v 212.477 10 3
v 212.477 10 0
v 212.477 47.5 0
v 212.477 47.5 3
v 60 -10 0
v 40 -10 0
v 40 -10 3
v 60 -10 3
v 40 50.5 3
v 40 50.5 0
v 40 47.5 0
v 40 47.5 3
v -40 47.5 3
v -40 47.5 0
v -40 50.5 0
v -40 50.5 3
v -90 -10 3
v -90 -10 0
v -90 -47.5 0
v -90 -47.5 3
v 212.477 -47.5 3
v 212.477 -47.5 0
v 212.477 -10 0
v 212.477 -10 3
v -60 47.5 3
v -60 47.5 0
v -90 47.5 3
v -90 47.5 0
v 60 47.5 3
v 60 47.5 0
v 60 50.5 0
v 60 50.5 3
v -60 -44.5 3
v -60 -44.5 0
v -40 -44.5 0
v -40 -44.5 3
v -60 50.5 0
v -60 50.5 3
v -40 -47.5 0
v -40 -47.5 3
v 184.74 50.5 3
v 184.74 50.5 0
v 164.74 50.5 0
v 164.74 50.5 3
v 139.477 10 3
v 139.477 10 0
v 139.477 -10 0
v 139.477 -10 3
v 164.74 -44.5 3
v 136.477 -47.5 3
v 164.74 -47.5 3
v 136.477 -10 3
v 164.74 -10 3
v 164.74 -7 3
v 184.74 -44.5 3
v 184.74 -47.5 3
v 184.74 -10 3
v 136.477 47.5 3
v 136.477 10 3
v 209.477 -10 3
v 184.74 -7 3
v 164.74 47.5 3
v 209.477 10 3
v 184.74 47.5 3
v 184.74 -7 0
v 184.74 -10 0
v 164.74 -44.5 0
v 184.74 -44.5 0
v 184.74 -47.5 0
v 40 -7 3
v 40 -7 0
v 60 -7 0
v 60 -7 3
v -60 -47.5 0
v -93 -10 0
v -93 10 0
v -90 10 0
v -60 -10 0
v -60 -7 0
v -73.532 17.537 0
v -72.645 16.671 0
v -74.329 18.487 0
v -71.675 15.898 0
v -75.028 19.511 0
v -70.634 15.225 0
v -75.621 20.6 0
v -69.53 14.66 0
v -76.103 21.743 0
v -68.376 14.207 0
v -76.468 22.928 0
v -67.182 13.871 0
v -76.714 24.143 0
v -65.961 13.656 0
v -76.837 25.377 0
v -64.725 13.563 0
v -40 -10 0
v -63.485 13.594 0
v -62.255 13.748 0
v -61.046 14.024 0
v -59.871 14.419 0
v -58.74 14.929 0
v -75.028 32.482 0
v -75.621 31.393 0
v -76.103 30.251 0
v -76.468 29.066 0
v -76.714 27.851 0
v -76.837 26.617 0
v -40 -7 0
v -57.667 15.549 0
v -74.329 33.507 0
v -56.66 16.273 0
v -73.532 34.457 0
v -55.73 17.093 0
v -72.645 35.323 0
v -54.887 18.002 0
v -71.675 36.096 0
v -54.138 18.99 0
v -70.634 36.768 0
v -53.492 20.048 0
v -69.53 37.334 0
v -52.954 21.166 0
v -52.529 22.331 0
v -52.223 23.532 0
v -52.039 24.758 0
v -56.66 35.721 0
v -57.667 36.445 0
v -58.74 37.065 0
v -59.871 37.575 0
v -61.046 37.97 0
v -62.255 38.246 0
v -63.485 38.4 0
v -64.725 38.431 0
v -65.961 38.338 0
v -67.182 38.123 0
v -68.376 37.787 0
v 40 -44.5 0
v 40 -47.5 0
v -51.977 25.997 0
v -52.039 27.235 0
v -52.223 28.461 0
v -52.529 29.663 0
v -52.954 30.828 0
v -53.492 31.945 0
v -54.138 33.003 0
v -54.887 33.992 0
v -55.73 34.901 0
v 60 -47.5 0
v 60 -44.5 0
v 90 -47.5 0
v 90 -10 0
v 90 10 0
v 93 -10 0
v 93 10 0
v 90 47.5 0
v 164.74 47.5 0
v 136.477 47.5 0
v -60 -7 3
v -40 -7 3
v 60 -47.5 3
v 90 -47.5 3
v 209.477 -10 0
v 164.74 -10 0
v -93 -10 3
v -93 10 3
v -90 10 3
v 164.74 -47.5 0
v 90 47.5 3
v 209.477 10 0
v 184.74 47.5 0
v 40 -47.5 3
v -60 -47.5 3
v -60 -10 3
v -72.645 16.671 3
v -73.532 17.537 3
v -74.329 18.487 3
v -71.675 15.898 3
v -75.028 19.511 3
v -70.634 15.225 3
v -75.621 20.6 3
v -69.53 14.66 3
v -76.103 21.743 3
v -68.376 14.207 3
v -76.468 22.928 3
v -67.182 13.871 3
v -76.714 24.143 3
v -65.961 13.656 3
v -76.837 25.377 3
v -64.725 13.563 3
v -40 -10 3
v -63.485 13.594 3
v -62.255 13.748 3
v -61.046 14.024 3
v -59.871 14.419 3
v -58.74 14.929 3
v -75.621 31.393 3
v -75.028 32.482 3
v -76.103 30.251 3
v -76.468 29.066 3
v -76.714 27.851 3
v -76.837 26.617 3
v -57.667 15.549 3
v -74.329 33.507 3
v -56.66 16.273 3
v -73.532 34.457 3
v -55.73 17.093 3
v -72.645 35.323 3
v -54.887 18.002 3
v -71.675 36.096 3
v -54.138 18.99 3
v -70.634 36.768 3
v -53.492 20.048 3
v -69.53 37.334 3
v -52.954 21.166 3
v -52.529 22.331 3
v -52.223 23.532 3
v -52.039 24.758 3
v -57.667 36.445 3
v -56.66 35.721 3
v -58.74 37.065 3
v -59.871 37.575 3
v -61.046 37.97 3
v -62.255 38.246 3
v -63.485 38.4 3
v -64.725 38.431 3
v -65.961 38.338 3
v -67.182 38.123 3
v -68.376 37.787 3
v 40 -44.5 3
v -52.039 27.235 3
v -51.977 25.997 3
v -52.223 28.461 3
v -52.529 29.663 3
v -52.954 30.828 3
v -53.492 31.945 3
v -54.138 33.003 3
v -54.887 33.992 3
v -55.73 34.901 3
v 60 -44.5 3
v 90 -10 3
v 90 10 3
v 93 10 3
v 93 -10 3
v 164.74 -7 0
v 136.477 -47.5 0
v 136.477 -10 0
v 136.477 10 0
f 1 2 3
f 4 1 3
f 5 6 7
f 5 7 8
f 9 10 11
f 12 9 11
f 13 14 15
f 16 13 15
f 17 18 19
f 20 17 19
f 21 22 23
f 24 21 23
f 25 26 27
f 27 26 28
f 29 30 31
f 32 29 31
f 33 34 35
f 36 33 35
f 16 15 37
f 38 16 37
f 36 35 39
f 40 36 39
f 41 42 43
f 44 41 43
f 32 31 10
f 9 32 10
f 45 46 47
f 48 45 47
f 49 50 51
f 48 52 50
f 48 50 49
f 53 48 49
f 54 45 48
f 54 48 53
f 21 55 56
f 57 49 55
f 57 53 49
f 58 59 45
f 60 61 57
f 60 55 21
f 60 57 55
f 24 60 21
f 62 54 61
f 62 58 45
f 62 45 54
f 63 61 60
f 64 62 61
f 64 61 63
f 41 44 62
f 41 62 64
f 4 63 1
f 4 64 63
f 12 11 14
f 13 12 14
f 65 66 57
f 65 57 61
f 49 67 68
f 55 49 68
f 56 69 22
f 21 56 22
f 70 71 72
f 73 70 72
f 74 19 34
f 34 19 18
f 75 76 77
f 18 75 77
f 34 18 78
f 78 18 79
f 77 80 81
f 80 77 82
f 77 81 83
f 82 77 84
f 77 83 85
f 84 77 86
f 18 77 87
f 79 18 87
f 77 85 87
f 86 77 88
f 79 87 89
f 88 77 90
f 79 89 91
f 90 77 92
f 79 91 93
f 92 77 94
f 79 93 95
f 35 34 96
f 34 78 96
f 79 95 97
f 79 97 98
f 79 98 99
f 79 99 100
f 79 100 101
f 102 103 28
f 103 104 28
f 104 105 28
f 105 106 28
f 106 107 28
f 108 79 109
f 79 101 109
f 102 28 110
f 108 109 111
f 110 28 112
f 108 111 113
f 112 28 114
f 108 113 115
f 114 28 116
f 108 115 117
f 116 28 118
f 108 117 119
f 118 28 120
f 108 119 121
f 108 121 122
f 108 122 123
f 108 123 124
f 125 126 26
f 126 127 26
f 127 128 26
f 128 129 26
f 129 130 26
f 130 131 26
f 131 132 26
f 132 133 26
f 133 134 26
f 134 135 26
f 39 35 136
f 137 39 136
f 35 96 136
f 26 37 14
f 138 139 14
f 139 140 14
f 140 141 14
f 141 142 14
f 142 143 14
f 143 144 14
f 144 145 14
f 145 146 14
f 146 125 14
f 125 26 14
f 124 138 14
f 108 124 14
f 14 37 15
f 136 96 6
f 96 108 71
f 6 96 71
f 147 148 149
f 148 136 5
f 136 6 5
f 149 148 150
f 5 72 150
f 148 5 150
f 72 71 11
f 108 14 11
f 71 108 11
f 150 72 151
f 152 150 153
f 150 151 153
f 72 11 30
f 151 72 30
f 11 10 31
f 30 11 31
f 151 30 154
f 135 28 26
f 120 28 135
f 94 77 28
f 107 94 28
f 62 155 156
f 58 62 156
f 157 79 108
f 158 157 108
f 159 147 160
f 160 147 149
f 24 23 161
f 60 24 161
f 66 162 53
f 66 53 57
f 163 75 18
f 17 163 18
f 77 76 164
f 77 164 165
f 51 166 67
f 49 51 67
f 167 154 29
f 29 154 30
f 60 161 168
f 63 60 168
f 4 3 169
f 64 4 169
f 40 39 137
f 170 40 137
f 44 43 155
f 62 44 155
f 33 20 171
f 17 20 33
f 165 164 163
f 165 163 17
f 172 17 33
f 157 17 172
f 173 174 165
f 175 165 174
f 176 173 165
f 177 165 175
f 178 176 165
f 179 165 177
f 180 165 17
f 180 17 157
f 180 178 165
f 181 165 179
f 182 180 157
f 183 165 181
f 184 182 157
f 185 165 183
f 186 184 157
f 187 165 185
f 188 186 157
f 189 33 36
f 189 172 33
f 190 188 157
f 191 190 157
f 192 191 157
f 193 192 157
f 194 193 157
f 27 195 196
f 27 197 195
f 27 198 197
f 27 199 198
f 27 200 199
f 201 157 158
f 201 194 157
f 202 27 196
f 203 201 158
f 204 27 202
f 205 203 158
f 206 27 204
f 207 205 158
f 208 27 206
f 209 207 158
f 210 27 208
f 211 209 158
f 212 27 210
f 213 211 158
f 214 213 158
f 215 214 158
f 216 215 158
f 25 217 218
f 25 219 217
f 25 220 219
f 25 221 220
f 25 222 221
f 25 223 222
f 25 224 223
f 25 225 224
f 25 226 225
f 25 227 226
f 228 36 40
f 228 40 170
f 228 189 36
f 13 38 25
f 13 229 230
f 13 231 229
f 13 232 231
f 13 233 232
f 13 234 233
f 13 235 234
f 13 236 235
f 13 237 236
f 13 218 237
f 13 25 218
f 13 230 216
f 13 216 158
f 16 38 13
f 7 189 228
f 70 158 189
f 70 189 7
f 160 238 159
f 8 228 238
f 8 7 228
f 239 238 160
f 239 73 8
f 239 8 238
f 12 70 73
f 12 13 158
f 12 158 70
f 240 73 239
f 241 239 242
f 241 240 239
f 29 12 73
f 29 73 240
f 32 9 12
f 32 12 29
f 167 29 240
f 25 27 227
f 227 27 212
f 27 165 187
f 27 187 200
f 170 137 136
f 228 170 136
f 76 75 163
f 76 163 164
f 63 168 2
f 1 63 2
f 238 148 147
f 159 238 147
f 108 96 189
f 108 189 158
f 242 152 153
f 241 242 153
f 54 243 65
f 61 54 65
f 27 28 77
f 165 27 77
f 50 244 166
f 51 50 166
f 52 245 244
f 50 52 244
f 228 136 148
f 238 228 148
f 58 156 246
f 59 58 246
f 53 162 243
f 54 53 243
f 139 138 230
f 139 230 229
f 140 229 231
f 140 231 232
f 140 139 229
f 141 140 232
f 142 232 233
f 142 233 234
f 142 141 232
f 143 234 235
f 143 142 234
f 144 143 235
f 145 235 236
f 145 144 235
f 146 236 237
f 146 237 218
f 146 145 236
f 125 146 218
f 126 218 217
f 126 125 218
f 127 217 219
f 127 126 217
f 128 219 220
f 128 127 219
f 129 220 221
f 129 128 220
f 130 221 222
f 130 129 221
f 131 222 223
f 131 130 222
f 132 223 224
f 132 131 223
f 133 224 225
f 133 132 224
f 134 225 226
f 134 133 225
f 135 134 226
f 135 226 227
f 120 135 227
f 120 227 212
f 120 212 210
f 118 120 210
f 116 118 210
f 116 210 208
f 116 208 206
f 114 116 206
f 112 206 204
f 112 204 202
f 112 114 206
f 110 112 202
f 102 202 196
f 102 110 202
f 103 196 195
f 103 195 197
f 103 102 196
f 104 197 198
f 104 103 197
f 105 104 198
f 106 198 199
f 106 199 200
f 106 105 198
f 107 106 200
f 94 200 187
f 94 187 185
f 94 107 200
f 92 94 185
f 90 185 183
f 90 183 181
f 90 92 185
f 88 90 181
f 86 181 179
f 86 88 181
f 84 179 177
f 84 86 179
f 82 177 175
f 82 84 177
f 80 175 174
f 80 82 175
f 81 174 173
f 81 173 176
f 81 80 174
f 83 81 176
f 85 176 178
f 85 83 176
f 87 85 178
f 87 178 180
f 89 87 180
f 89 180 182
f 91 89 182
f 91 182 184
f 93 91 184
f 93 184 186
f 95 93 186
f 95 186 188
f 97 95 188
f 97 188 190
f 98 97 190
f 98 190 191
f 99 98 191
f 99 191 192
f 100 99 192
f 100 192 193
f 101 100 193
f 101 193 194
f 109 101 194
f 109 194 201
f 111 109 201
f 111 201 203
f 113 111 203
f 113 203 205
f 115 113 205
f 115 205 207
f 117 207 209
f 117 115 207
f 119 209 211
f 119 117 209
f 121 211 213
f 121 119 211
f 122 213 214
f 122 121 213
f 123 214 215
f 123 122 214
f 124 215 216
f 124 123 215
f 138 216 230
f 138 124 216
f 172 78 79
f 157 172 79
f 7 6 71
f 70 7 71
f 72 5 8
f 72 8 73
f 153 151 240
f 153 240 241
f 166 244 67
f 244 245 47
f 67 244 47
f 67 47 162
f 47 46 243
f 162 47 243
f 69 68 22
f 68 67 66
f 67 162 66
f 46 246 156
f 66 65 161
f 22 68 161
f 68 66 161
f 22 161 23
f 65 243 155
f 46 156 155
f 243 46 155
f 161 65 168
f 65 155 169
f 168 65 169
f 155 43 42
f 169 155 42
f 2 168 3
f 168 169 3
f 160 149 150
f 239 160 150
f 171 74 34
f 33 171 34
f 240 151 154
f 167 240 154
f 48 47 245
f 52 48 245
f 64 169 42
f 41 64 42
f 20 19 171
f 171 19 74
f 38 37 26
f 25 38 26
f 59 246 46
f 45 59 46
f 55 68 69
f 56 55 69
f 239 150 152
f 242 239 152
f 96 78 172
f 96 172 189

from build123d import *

# Parameters (mm, degrees)
F1_W     = 20
F1_H     = 3
F1_R     = 12.4378806179
F1_W_2   = 3
F1_H_2   = 20
F2_DEPTH = 3
F3_DEPTH = 3


# Not quite as in the source:
# - a feature names something its author has since deleted; it is built from what else it names


with BuildPart() as f2:
    # F1 (on Top) → F2 (new body)
    with BuildSketch(Plane.XY):
        Polygon((-90, -10), (-90, -47.5), (-60, -47.5), (-60, -44.5), (-40, -44.5), (-40, -47.5), (40, -47.5), (40, -44.5), (60, -44.5), (60, -47.5), (90, -47.5), (90, -10), (90, 10), (90, 47.5), (60, 47.5), (60, 50.5), (40, 50.5), (40, 47.5), (-40, 47.5), (-40, 50.5), (-60, 50.5), (-60, 47.5), (-90, 47.5), (-90, 10), align=None)
        with Locations((-50, -8.5)):
            Rectangle(F1_W, F1_H, mode=Mode.SUBTRACT)
        with Locations((50, -8.5)):
            Rectangle(F1_W, F1_H, mode=Mode.SUBTRACT)
        with Locations((-64.4147619605, 25.9968824685)):
            Circle(F1_R, mode=Mode.SUBTRACT)
        with Locations((91.5, 0)):
            Rectangle(F1_W_2, F1_H_2)
        with Locations((-91.5, 0)):
            Rectangle(F1_W_2, F1_H_2)
    extrude(amount=F2_DEPTH)


with BuildPart() as f3:
    # F1 (on Top) → F3 (new body)
    with BuildSketch(Plane.XY):
        Polygon((212.4768147469, -10), (209.4768147469, -10), (209.4768147469, 10), (212.4768147469, 10), (212.4768147469, 47.5), (184.7395757437, 47.5), (184.7395757437, 50.5), (164.7395757437, 50.5), (164.7395757437, 47.5), (136.4768147469, 47.5), (136.4768147469, 10), (139.4768147469, 10), (139.4768147469, -10), (136.4768147469, -10), (136.4768147469, -47.5), (164.7395757437, -47.5), (164.7395757437, -44.5), (184.7395757437, -44.5), (184.7395757437, -47.5), (212.4768147469, -47.5), align=None)
        with Locations((174.7395757437, -8.5)):
            Rectangle(F1_W, F1_H, mode=Mode.SUBTRACT)
    extrude(amount=F3_DEPTH)


solid = Compound([f2.part, f3.part])
